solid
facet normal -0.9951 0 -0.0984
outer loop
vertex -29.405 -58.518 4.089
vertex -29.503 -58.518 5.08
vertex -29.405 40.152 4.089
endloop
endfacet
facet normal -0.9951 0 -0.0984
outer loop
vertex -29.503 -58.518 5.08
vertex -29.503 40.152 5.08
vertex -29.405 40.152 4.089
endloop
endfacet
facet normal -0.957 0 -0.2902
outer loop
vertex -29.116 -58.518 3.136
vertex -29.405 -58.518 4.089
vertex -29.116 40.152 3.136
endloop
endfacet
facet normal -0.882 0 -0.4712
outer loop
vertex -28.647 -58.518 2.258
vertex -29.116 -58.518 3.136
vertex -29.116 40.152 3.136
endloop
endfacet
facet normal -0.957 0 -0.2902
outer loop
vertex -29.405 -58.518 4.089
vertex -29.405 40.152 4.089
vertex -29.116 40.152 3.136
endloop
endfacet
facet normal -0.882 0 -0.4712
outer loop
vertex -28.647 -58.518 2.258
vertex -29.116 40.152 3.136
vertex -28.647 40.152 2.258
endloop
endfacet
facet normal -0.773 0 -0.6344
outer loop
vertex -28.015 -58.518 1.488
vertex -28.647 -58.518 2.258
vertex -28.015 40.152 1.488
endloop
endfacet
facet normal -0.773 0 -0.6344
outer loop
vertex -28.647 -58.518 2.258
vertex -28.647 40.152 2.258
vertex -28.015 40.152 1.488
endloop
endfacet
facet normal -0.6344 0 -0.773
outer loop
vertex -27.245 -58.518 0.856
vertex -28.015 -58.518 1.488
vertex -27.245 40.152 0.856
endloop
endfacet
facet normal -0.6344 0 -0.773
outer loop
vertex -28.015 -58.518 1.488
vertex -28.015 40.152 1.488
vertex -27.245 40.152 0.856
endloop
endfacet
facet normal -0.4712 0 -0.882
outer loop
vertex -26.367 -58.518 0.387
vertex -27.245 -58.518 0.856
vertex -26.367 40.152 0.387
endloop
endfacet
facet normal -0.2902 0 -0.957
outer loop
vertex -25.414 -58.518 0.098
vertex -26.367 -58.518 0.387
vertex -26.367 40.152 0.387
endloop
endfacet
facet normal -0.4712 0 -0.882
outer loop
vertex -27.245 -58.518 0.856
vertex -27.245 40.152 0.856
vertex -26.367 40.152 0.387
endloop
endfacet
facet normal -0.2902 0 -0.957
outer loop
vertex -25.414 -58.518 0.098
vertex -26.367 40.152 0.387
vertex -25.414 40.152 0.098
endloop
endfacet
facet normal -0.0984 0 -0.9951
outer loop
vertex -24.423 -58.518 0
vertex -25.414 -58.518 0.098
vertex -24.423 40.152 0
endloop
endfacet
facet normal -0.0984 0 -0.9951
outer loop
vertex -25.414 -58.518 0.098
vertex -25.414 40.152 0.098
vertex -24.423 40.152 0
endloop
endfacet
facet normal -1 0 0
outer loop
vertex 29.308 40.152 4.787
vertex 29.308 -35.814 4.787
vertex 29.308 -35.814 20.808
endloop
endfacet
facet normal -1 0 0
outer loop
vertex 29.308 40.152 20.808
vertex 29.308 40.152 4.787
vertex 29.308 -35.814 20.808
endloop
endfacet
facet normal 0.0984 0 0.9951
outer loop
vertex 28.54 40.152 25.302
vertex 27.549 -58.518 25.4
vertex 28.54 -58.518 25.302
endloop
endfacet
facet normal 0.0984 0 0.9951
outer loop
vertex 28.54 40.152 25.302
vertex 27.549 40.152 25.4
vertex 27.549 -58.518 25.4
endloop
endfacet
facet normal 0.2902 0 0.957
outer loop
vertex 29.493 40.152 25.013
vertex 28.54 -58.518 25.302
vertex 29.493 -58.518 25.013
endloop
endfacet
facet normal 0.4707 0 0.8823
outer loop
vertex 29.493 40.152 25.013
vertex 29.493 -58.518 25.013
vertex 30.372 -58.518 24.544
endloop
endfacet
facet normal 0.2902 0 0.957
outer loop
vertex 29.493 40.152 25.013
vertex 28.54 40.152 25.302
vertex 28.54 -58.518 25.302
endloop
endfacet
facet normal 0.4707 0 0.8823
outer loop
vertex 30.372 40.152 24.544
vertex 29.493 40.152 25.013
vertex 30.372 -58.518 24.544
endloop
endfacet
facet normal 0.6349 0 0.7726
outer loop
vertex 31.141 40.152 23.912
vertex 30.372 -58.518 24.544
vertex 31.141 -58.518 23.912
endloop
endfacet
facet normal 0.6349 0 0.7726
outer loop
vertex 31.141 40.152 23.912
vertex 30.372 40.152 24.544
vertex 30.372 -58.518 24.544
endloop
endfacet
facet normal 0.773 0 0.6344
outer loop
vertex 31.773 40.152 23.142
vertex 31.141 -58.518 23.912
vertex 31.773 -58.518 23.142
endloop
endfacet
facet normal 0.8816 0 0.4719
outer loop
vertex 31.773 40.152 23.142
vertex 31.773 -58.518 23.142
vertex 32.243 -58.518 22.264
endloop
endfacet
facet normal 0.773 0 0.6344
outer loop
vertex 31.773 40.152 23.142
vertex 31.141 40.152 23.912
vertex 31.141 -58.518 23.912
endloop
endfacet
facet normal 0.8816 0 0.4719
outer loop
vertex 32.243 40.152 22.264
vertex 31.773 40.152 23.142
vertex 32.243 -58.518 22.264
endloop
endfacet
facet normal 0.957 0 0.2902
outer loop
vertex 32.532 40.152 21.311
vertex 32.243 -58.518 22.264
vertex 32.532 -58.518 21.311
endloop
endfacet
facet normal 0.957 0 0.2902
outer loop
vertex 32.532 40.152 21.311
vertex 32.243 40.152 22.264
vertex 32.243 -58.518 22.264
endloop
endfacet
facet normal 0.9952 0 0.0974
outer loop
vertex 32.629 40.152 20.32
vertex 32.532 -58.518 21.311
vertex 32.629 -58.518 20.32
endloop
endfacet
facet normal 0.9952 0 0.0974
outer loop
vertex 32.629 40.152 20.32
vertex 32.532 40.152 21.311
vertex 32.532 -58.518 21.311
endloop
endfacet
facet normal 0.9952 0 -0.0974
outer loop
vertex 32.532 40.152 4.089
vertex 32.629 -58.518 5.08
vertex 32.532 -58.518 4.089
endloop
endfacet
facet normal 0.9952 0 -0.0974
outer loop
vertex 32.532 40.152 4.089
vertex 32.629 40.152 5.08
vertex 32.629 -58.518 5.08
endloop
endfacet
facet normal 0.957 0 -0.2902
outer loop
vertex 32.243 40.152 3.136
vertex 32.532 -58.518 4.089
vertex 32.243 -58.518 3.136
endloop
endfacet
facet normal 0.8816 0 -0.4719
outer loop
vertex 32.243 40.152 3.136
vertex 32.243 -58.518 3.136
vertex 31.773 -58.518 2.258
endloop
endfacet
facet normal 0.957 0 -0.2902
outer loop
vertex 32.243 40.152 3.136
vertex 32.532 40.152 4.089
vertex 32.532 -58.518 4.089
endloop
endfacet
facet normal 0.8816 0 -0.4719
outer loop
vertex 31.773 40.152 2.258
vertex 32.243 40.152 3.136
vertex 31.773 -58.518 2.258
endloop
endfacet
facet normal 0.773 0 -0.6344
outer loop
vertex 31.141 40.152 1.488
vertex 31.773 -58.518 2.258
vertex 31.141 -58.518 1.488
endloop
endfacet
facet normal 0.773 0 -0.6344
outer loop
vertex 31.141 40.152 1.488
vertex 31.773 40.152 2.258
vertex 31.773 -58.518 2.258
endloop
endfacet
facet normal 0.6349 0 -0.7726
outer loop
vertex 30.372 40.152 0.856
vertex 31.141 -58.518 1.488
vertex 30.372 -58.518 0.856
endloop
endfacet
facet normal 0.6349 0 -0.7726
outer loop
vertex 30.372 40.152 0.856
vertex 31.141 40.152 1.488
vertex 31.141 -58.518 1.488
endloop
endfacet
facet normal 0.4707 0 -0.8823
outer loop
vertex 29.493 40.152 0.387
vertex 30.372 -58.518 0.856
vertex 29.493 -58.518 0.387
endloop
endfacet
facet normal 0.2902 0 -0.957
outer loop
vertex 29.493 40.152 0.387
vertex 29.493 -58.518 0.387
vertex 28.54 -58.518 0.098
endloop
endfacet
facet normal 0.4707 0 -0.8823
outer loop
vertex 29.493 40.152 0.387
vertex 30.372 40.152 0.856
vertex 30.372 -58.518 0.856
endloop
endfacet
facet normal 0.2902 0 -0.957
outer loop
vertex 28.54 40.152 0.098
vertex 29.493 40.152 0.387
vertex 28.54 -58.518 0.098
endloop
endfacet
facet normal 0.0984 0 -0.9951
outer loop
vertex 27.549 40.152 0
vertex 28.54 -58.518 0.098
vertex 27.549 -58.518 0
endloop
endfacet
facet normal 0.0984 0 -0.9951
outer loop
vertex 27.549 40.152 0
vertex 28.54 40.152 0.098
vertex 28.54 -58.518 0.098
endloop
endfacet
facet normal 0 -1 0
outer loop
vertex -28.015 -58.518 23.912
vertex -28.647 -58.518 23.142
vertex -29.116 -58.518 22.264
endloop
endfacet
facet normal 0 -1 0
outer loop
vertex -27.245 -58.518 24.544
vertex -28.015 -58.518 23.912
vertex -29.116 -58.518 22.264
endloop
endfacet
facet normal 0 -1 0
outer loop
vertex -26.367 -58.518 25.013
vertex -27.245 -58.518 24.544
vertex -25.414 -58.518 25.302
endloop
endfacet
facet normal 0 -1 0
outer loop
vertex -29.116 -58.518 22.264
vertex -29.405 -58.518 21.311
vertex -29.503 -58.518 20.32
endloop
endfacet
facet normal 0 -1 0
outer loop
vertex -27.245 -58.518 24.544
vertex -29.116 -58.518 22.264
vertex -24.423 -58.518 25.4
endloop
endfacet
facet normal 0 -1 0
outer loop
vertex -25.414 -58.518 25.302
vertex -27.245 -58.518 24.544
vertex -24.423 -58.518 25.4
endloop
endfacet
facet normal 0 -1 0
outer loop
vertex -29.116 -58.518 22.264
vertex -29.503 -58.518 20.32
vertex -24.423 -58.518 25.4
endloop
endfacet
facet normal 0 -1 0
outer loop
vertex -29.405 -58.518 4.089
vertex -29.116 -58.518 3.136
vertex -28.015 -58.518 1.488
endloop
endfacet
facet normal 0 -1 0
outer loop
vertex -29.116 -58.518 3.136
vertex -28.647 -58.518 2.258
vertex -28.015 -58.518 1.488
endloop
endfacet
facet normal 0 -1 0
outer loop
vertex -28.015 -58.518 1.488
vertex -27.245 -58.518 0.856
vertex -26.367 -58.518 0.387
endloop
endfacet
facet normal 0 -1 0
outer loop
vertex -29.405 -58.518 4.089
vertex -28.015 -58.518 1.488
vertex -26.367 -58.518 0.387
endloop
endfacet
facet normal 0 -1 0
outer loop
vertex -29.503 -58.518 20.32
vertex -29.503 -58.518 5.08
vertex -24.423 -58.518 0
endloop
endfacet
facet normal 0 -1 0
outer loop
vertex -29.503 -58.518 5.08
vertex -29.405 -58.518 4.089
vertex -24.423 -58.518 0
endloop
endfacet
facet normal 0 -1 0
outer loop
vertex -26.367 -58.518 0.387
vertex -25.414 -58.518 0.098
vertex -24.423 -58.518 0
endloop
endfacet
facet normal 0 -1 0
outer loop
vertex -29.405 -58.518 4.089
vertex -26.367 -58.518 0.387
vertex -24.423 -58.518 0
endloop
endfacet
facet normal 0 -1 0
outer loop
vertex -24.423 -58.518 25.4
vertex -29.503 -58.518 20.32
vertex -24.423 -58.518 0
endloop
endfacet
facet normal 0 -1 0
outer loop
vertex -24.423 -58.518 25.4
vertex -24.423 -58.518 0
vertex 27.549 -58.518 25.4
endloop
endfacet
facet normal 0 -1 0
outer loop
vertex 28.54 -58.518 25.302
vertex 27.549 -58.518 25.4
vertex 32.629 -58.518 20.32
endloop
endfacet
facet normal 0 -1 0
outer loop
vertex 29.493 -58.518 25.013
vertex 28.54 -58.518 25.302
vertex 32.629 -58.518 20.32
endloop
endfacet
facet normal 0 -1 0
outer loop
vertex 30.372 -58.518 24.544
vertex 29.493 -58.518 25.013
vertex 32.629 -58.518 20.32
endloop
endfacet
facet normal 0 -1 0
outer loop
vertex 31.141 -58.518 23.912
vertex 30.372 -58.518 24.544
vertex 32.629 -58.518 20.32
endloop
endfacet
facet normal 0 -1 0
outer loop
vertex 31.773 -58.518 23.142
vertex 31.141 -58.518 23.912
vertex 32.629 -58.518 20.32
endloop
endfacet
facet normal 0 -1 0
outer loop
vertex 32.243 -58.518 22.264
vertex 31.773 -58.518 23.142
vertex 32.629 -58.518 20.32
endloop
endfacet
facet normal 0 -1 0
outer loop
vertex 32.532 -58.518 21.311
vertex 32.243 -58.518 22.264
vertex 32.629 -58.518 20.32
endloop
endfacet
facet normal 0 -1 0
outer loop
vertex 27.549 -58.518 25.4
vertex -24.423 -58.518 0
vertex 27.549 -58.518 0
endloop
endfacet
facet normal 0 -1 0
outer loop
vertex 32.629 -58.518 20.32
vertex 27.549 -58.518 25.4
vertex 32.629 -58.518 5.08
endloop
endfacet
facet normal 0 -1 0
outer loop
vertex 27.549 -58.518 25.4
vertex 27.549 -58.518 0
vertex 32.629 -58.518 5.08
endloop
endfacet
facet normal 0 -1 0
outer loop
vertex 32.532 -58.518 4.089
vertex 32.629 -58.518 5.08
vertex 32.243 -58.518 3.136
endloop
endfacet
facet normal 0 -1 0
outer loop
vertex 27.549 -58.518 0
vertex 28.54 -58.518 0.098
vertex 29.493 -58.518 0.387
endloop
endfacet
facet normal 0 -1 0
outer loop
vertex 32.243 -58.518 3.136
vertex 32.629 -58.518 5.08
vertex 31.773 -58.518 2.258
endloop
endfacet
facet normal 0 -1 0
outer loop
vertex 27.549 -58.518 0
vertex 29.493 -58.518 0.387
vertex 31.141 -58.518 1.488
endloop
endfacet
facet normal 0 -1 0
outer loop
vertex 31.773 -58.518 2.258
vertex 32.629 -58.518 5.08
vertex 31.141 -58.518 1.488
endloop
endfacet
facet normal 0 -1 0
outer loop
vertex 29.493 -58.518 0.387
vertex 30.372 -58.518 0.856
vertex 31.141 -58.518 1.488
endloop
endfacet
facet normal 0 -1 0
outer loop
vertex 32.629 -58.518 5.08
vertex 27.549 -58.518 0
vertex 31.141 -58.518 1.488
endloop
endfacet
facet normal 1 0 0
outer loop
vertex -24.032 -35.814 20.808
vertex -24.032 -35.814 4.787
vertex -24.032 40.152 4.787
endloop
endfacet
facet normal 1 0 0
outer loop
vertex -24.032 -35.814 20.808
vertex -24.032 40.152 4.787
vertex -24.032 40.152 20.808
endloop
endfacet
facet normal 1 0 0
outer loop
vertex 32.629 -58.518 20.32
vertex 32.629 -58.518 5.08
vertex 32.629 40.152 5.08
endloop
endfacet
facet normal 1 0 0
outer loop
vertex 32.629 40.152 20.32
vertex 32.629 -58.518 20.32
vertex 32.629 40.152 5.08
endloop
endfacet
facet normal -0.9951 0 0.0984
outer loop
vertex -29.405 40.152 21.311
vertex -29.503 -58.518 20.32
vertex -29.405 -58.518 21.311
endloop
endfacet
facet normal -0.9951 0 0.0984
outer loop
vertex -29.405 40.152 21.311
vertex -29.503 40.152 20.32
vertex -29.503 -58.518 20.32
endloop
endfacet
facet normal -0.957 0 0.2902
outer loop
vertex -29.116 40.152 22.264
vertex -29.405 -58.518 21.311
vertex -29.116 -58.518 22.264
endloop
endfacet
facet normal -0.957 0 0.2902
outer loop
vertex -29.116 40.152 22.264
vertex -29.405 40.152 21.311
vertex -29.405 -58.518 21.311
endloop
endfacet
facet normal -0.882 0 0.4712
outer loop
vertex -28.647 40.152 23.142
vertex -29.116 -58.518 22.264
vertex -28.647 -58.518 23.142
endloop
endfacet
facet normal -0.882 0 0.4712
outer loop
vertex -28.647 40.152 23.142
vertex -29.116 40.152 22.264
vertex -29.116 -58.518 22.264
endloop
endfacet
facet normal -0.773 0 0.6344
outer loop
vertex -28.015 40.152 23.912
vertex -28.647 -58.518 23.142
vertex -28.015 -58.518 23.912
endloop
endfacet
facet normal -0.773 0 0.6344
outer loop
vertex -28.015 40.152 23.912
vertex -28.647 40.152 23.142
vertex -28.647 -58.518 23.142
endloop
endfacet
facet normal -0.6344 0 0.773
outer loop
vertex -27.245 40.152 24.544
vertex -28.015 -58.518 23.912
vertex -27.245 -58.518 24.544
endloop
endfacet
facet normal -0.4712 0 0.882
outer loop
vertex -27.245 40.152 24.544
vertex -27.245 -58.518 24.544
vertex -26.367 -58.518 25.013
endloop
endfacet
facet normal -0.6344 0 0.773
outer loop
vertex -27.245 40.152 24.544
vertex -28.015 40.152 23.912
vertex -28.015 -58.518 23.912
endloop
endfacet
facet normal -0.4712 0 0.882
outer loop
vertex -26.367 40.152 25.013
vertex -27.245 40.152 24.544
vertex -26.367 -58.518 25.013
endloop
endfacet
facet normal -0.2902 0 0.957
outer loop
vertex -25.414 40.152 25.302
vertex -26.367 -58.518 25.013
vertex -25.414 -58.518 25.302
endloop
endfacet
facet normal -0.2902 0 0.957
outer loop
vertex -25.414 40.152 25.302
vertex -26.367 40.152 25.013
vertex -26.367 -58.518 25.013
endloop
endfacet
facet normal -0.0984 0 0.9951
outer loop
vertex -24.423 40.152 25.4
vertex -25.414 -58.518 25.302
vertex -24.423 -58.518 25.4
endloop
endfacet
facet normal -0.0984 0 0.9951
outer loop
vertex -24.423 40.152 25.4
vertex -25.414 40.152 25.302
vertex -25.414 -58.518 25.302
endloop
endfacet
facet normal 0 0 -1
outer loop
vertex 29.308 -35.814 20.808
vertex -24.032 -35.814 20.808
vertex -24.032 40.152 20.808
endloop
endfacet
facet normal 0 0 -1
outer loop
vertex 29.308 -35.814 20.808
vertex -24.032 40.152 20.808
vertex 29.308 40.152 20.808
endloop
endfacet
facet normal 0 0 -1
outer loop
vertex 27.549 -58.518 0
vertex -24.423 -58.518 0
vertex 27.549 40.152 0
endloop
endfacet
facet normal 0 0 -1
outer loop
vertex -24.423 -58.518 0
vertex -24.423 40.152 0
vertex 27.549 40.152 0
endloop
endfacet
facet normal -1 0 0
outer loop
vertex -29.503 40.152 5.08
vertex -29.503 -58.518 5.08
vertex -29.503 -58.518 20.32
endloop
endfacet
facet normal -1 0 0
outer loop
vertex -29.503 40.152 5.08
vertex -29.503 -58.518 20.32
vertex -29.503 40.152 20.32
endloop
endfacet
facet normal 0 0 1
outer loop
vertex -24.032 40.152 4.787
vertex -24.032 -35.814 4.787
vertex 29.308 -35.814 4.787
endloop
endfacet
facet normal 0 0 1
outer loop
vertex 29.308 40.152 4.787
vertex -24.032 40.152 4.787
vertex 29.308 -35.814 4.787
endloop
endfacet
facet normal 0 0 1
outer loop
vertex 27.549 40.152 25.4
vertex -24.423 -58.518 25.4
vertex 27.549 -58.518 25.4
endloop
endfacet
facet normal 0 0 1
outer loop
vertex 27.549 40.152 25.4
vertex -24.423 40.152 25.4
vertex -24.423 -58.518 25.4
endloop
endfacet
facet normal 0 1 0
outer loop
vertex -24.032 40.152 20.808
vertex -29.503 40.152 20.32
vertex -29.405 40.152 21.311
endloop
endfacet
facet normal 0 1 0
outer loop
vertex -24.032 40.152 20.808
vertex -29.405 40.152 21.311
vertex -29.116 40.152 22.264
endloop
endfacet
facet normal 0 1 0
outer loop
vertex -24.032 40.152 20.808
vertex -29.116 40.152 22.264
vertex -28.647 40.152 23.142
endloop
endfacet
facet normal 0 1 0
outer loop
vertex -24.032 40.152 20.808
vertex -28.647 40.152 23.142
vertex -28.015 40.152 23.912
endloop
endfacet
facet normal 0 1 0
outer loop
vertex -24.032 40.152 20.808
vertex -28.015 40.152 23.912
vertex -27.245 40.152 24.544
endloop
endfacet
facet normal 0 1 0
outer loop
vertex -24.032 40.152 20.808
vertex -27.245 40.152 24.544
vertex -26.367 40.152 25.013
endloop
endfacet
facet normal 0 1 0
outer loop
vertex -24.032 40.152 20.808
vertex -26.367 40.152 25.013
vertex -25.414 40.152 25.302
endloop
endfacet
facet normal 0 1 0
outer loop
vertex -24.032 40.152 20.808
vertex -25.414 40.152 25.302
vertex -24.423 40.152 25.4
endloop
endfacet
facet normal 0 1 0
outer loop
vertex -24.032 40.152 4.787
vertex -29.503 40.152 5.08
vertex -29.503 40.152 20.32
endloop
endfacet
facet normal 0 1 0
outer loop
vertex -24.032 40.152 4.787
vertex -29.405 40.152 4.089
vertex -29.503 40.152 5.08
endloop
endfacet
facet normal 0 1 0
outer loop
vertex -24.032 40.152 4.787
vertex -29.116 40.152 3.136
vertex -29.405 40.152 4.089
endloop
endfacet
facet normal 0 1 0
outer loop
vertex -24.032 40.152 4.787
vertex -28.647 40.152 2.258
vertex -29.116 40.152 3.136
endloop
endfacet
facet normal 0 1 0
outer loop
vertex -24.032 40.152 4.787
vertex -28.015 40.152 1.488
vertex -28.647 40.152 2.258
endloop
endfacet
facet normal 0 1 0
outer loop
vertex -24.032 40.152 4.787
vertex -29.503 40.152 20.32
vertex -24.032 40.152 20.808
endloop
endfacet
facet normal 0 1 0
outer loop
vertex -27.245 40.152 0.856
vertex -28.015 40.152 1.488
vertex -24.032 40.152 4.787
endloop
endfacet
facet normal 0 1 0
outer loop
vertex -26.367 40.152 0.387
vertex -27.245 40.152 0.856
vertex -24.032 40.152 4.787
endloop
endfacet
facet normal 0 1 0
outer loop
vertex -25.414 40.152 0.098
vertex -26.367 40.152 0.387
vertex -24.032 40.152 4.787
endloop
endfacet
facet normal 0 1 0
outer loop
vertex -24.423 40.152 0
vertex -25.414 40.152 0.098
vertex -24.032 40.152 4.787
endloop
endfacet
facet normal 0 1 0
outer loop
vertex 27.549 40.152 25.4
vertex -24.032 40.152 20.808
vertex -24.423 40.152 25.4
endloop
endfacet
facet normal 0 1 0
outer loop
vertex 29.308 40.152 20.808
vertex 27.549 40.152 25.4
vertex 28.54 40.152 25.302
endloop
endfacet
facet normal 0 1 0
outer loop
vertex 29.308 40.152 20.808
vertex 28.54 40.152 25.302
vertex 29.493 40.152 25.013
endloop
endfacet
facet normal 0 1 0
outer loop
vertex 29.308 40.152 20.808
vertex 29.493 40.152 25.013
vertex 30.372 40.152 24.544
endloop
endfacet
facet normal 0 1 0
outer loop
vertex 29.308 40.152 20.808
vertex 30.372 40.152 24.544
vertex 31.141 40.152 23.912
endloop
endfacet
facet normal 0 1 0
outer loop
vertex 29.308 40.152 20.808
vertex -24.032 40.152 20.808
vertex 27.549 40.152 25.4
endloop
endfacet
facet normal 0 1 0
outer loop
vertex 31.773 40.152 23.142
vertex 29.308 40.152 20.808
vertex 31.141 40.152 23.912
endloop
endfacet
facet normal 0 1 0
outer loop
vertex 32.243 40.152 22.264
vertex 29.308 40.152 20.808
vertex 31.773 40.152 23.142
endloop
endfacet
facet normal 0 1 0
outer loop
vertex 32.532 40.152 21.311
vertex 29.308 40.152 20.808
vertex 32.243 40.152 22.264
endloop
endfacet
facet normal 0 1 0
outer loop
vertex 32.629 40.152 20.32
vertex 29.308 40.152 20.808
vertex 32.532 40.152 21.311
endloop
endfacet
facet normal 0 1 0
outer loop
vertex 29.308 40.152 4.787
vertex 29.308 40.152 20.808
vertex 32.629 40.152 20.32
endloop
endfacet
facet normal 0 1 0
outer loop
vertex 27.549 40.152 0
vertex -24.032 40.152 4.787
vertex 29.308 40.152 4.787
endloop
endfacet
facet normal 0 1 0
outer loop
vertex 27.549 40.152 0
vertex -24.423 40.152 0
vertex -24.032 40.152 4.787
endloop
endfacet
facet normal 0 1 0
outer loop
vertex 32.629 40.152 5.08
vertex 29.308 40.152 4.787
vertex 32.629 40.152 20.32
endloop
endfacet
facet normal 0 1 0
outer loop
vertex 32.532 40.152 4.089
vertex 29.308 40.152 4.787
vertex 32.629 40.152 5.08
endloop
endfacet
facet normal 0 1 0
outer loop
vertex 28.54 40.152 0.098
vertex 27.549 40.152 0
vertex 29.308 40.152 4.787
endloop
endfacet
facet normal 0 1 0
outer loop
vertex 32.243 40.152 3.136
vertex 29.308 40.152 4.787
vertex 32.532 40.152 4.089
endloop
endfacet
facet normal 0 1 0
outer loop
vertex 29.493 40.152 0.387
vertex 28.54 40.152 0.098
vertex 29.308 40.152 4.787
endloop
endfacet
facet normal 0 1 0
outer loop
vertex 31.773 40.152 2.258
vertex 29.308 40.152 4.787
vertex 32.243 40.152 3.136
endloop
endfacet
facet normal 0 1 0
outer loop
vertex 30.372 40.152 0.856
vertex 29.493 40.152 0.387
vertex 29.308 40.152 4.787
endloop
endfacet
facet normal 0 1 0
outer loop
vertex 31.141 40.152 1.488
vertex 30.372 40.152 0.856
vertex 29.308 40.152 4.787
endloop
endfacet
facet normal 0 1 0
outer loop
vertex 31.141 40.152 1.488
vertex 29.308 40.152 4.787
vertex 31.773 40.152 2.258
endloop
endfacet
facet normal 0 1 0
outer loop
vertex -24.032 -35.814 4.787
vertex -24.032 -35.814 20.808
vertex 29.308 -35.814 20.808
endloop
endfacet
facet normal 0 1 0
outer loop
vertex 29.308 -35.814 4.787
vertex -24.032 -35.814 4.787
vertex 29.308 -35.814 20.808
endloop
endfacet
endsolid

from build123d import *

# Parameters (mm, degrees)
F0_W          = 62.132306397
F0_H          = 98.6692346632
F1_DEPTH      = 25.4
F2_W          = 53.3400010318
F2_H          = 16.0215389915
F3_DEPTH      = 159.004
F3_DEPTH_BACK = 35.814
F4_R          = 5.08


with BuildPart() as f1:
    # F0 (on Top) → F1 (new body)
    with BuildSketch(Plane.XY):
        with Locations((1.5630759299, -9.1830771416)):
            Rectangle(F0_W, F0_H)
    extrude(amount=F1_DEPTH)

    # F2 (on Front) → F3 (cut, two sides)
    with BuildSketch(Plane.XZ) as f3_sk:
        with Locations((2.6376927271, 12.7976925578)):
            Rectangle(F2_W, F2_H)
    extrude(amount=-F3_DEPTH, mode=Mode.SUBTRACT)
    extrude(f3_sk.sketch, amount=F3_DEPTH_BACK, mode=Mode.SUBTRACT)

    # F4
    f4_edges = [f1.edges().sort_by_distance(p)[0] for p in [
        (32.629229, -9.183077, 25.4),
        (-29.503077, -9.183077, 25.4),
        (-29.503077, -9.183077, 0),
        (32.629229, -9.183077, 0),
    ]]
    fillet(f4_edges, radius=F4_R)


solid = f1.part
